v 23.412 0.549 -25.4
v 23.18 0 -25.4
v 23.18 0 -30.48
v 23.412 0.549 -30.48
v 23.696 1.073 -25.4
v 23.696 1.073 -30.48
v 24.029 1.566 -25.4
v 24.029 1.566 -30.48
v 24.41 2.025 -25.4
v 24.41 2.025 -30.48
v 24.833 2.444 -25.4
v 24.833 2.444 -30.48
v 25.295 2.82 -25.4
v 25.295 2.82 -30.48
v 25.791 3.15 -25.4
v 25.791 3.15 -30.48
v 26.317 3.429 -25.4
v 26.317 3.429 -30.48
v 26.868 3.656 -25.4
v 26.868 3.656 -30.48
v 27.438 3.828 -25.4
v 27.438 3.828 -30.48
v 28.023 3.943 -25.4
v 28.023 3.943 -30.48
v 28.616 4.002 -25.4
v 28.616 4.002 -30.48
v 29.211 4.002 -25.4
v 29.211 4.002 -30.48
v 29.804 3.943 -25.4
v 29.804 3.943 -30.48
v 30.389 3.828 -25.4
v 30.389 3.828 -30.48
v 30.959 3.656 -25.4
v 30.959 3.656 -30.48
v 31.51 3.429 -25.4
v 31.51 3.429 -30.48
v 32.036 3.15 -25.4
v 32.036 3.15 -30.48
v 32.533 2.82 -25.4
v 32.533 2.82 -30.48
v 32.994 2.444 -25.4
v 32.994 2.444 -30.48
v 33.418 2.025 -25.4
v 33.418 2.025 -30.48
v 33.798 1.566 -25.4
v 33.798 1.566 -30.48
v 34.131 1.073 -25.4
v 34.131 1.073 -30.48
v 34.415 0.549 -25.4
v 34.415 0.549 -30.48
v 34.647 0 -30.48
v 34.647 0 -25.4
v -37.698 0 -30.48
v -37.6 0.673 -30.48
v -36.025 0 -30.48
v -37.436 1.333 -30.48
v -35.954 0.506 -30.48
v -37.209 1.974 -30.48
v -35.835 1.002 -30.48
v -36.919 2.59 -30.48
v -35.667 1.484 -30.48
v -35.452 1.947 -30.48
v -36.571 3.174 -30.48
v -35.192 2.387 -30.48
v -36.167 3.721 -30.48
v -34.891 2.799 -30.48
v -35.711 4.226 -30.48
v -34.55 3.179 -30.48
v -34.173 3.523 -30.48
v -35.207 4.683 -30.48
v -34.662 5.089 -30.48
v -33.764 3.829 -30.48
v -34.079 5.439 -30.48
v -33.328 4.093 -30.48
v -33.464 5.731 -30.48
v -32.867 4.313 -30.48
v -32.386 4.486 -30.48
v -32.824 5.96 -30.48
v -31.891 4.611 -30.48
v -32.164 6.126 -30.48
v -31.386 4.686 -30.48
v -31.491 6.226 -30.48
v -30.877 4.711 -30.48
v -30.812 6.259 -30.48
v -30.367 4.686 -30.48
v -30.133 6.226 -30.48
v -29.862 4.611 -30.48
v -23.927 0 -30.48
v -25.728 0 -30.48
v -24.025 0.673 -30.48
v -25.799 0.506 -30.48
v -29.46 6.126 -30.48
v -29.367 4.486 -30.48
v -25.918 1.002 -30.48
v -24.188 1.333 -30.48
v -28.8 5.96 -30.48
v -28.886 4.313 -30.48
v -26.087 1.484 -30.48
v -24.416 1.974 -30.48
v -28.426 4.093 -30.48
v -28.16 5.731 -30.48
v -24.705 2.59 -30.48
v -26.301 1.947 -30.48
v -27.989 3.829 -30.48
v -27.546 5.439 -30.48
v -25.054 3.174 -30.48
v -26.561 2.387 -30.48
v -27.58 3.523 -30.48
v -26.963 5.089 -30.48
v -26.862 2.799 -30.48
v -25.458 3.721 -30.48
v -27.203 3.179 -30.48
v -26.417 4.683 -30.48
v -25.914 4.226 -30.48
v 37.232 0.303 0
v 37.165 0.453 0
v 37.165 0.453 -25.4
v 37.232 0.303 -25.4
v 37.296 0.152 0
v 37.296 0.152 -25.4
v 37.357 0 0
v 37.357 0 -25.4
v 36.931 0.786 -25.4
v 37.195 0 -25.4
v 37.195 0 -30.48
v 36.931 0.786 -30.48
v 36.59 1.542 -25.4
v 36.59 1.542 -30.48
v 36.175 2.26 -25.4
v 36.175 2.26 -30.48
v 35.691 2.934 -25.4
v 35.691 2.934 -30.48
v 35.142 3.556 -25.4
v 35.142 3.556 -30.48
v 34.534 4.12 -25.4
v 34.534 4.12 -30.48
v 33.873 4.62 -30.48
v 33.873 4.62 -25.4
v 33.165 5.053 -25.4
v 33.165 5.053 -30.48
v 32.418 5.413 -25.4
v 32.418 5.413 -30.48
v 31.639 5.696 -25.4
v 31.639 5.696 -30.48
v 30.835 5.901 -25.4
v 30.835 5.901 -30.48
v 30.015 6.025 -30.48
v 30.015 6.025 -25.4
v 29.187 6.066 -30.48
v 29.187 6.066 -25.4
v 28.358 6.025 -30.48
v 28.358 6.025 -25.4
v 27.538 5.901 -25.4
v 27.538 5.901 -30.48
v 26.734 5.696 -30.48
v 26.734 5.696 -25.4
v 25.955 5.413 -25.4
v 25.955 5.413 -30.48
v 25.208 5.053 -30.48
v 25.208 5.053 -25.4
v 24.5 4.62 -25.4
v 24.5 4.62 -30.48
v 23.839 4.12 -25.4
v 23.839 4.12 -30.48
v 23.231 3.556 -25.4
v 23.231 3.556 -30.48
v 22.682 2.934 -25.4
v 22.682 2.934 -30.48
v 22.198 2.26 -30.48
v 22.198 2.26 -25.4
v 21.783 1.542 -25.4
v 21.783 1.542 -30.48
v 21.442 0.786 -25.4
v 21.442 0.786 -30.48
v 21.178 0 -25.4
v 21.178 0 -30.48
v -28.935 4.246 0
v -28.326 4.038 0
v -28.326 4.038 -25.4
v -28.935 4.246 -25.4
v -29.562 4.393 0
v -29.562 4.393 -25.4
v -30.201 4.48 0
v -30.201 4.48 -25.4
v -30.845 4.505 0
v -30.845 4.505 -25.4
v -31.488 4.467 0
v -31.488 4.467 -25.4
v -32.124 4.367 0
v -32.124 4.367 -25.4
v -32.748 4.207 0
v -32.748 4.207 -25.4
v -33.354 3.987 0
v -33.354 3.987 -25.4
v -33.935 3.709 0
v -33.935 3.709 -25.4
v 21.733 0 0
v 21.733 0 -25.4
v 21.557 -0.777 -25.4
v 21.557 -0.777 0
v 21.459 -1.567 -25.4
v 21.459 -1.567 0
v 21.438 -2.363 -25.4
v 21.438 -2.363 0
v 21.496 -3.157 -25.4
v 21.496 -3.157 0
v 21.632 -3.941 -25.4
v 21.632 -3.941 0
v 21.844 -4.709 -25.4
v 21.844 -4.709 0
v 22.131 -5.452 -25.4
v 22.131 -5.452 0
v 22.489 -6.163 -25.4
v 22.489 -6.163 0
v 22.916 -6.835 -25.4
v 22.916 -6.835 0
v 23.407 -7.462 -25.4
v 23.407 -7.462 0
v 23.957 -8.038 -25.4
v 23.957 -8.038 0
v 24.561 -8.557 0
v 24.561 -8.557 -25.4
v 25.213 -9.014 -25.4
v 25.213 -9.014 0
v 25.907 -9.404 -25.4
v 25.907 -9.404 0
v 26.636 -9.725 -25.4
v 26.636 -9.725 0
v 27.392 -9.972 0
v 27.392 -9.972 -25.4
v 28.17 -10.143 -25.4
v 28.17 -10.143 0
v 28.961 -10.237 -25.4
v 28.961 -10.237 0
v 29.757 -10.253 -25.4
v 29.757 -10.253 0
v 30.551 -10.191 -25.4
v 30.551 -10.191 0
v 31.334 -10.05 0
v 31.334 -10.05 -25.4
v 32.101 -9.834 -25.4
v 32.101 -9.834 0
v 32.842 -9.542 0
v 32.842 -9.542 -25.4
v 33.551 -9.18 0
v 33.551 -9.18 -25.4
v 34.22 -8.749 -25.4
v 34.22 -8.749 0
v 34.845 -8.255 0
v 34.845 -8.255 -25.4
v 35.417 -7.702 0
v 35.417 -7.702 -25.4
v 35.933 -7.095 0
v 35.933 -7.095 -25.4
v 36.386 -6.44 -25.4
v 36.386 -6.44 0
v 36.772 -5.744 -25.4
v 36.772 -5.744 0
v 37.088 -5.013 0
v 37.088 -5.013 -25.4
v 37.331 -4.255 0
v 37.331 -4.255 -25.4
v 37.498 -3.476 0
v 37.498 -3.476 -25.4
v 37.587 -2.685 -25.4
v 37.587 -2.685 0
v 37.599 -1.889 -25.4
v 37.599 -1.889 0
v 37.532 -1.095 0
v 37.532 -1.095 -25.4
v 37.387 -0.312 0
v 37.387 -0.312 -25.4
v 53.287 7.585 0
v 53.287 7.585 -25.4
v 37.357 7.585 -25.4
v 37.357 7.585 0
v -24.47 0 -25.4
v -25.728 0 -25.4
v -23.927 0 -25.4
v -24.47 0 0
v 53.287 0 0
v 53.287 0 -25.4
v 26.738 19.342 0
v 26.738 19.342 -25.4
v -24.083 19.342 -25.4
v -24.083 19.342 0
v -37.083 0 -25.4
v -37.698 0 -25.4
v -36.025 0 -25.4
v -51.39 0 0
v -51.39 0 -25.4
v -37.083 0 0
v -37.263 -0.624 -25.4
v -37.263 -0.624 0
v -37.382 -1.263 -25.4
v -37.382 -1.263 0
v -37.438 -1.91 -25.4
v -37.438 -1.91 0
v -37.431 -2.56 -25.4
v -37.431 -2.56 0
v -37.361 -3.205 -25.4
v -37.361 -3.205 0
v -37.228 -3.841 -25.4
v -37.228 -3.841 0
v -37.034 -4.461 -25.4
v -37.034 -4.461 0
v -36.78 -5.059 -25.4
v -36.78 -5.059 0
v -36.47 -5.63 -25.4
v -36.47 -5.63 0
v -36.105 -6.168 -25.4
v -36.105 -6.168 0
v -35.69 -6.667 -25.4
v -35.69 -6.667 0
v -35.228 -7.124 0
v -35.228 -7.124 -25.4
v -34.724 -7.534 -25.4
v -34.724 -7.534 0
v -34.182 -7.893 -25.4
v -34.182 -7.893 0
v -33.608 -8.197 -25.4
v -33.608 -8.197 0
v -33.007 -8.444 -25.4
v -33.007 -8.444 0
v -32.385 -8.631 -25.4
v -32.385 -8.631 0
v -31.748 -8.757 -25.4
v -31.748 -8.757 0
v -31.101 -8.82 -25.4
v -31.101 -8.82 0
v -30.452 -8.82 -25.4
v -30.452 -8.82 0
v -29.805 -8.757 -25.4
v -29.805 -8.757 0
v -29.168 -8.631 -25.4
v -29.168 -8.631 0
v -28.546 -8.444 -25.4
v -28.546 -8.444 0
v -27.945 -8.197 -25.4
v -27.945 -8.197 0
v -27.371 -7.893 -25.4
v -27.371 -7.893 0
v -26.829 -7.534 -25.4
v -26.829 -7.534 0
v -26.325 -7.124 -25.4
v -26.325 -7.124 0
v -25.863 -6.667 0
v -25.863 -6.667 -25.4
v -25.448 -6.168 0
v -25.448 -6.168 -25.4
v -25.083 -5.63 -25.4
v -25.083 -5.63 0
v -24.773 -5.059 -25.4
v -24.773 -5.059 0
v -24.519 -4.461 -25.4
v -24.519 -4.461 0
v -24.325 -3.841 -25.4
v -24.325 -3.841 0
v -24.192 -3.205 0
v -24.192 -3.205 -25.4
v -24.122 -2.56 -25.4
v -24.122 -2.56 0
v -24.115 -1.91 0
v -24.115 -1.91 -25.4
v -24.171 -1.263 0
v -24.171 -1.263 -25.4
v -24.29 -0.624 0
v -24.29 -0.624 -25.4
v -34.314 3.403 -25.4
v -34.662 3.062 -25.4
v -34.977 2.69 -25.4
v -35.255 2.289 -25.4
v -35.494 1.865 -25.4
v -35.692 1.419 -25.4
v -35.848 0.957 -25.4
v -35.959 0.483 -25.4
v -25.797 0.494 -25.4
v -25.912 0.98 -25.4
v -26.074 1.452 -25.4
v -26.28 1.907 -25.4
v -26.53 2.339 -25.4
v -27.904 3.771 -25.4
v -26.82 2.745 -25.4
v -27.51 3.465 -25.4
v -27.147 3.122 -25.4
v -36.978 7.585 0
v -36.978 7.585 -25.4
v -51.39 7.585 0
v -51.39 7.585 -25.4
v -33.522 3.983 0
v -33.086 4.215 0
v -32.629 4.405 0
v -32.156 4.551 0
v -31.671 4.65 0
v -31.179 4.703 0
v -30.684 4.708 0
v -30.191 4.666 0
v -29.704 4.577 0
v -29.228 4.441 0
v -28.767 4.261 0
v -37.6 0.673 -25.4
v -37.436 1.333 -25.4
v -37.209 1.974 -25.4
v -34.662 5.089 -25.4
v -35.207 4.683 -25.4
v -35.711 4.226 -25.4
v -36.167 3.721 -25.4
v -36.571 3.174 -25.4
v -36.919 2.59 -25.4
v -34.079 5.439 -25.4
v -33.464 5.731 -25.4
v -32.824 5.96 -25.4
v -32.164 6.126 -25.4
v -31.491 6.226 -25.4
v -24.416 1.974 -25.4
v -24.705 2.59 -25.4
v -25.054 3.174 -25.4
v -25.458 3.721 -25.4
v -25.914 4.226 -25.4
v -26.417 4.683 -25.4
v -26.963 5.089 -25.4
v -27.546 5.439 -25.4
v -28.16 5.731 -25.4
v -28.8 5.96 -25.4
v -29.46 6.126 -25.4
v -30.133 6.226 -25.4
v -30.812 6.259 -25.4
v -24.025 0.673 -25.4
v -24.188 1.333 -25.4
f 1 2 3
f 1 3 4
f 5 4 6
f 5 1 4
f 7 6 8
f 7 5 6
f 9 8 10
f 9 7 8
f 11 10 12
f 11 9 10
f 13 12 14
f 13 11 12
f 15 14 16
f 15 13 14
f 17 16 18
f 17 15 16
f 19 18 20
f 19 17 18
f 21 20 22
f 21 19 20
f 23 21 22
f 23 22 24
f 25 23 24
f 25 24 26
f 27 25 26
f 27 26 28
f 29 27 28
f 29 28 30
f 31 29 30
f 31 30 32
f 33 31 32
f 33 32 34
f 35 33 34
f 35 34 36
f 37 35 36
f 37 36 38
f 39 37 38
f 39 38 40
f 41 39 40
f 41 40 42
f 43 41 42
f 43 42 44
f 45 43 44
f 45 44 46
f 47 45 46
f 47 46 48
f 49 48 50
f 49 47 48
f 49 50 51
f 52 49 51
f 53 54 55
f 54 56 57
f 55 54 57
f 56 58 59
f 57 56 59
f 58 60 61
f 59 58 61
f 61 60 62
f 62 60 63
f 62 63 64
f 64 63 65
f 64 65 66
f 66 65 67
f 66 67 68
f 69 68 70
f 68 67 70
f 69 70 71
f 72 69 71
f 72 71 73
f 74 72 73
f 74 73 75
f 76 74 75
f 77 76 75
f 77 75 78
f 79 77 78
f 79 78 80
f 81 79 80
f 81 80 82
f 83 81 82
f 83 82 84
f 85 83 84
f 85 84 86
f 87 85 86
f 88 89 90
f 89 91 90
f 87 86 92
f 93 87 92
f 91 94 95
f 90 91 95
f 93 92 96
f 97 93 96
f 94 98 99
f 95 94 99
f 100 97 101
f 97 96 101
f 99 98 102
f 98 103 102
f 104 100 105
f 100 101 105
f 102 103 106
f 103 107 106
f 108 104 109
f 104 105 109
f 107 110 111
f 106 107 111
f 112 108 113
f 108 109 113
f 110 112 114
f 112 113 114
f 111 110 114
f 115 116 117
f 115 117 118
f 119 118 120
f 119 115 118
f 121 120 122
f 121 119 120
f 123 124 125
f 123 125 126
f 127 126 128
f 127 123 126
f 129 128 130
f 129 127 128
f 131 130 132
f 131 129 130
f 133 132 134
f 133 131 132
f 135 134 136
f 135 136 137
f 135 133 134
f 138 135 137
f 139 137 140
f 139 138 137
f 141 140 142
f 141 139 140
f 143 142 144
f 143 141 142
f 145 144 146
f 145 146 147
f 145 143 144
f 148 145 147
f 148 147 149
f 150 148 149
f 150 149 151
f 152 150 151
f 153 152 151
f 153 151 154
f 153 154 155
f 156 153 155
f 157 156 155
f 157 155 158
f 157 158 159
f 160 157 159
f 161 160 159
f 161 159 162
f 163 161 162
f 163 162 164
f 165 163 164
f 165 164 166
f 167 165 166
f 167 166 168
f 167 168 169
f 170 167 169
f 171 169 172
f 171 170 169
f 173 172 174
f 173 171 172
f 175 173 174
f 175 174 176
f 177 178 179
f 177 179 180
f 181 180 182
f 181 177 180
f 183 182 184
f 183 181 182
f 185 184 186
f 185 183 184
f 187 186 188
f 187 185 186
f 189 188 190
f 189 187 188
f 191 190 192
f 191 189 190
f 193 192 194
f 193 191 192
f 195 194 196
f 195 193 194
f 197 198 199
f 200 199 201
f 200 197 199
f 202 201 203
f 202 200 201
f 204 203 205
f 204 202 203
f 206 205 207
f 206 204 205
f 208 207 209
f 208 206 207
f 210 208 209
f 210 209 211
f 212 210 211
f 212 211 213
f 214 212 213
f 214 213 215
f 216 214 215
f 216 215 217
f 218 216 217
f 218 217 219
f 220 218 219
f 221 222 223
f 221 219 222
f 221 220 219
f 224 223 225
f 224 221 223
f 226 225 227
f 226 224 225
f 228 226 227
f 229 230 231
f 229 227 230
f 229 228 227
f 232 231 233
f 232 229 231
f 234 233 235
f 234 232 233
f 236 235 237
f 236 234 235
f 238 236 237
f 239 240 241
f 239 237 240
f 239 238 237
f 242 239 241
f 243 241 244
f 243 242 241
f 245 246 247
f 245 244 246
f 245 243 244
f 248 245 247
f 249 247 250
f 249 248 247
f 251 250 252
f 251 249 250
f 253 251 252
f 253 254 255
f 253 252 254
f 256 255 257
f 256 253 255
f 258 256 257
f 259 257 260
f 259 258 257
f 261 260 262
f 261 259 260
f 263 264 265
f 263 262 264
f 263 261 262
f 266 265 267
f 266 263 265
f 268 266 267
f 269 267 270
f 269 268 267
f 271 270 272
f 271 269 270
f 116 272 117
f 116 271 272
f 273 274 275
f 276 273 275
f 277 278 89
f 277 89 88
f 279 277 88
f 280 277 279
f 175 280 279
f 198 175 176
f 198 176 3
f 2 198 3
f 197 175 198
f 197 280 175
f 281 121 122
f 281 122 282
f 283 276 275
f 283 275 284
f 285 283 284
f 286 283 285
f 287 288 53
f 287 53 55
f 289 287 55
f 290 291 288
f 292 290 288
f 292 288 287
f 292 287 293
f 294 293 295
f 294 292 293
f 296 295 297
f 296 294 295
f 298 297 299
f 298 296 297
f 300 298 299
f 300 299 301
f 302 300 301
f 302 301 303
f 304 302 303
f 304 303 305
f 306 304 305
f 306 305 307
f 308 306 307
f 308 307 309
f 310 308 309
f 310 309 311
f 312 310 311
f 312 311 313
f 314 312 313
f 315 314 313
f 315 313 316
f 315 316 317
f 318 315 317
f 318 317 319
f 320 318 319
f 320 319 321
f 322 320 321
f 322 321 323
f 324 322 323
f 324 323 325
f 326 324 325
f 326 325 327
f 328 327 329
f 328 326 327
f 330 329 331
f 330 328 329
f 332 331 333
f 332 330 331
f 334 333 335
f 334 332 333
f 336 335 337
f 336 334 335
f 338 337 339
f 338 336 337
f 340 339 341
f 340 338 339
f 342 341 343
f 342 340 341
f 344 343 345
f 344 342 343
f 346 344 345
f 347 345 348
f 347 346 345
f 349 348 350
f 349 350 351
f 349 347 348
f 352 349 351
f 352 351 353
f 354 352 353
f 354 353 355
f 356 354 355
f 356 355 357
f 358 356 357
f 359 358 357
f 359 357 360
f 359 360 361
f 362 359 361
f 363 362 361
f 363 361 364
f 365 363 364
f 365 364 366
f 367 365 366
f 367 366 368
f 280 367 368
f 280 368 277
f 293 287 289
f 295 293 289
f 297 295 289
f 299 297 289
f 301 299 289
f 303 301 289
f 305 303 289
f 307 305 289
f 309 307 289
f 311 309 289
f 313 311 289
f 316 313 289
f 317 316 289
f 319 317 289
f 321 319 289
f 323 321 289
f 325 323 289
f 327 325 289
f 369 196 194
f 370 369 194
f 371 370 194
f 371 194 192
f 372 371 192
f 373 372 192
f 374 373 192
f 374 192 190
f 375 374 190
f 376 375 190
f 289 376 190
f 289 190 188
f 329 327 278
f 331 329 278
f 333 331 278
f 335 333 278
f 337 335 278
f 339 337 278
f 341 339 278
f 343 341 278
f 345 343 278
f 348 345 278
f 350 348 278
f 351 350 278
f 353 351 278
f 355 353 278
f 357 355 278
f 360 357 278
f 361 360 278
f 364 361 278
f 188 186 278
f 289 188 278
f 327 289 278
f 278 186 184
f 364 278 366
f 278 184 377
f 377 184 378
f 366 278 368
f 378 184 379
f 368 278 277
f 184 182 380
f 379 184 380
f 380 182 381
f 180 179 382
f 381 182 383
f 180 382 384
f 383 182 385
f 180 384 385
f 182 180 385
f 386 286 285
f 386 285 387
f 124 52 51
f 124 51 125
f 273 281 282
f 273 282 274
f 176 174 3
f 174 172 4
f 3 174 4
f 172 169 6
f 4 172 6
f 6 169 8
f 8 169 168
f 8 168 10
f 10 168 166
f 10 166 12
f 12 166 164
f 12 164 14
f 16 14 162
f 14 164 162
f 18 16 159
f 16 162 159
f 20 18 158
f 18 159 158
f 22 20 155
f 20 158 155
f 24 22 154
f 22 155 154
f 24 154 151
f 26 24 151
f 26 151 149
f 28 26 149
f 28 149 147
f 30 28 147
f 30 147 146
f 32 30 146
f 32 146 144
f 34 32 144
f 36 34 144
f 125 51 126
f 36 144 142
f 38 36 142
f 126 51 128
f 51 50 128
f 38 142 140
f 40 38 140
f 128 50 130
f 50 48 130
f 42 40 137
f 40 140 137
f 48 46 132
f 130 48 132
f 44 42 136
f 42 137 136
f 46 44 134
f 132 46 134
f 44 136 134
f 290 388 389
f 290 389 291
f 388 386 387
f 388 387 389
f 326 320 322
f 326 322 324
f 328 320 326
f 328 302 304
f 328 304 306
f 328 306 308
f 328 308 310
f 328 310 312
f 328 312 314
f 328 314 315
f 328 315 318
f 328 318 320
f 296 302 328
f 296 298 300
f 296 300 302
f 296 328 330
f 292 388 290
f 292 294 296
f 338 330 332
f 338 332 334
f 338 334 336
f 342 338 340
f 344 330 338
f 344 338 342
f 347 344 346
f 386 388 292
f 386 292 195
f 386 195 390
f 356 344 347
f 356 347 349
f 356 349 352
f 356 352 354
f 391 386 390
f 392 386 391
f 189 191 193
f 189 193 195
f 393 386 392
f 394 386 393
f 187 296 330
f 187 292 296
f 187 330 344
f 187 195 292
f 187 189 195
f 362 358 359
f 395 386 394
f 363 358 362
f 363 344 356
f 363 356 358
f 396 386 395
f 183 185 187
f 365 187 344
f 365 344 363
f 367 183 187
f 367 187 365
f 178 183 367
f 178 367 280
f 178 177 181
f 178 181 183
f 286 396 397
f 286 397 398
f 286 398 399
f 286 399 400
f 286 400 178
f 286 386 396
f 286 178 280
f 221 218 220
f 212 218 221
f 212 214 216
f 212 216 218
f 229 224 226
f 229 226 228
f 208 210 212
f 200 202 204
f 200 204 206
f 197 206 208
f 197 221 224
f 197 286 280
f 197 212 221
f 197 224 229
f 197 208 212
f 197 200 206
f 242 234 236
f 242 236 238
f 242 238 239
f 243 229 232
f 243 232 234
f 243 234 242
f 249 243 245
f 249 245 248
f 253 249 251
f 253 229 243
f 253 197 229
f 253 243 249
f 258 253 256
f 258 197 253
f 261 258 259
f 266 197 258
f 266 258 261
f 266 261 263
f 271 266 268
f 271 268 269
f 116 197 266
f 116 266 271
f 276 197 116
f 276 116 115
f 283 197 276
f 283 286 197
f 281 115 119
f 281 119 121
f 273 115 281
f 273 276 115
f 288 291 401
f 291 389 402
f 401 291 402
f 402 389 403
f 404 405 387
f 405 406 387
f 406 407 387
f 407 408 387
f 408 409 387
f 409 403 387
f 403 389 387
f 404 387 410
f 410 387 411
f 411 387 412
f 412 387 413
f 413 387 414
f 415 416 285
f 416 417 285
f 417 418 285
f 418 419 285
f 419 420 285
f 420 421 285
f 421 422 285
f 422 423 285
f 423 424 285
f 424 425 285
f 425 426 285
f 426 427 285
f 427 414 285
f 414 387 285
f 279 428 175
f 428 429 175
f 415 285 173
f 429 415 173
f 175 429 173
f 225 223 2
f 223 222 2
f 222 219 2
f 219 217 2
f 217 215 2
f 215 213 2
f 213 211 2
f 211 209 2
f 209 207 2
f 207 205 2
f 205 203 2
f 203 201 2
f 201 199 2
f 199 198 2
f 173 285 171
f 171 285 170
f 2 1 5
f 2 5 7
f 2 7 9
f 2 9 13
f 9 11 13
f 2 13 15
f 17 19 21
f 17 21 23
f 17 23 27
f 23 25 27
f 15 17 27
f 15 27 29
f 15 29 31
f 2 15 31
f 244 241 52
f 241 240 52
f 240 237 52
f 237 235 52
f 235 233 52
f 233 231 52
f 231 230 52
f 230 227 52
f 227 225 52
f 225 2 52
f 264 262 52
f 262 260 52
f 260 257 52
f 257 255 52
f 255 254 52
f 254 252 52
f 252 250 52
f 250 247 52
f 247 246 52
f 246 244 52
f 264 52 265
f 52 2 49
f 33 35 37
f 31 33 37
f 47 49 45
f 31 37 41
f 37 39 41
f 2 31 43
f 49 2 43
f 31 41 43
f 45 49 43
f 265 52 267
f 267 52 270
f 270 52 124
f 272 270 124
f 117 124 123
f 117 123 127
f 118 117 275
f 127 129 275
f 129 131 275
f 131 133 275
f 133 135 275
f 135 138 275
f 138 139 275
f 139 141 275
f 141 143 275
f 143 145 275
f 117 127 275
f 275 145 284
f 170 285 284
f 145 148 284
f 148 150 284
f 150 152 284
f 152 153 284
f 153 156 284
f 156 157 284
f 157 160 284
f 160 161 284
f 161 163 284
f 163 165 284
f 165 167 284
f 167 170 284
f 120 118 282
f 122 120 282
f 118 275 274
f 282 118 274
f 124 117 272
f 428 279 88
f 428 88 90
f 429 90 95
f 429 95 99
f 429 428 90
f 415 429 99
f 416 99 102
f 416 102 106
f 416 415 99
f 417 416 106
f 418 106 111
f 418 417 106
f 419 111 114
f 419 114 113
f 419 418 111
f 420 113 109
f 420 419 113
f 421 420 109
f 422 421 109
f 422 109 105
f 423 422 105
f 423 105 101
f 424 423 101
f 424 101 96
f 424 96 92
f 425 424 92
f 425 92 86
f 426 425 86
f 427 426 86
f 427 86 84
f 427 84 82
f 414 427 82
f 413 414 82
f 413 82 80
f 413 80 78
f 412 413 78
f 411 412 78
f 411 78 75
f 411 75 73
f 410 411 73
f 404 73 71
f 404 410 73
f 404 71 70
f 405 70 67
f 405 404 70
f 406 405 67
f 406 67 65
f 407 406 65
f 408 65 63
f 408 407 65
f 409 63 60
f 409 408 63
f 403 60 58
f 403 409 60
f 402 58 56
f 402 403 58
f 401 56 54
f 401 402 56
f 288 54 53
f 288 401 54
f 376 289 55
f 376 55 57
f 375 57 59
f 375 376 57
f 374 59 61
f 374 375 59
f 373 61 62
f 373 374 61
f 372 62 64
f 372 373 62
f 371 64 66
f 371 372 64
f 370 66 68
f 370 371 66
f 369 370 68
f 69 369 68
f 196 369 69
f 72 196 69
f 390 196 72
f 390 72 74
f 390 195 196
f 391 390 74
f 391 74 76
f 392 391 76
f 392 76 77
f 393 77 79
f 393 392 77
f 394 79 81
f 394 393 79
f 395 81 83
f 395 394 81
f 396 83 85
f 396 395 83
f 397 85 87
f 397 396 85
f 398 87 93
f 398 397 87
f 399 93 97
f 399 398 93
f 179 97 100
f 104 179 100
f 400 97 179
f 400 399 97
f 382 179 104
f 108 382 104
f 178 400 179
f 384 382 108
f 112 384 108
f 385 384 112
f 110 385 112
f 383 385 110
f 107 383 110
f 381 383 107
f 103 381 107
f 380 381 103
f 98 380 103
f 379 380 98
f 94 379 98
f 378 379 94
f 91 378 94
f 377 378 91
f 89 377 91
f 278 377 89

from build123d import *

# Parameters (mm, degrees)
F1_DEPTH = 25.4
F2_R     = 6.666514
F2_R_2   = 8.083865
F3_DEPTH = 25.4
F5_DEPTH = 30.48


with BuildPart() as f1:
    # F0 (on Top) → F1 (new body)
    with BuildSketch(Plane.XY):
        with BuildLine():
            Line((-51.390246, 7.585276), (-51.390246, 0))
            Line((-51.390246, 0), (-36.978222, 0))
            ThreePointArc((-36.978222, 0), (-30.530737, 4.941209), (-24.083251, 0))
            Line((-24.083251, 0), (21.807669, 0))
            ThreePointArc((21.807669, 0), (29.582576, 5.313651), (37.357483, 0))
            Line((37.357483, 0), (53.286567, 0))
            Line((53.286567, 0), (53.286567, 7.585276))
            Line((53.286567, 7.585276), (37.357483, 7.585276))
            Line((37.357483, 7.585276), (26.7381, 19.342454))
            Line((26.7381, 19.342454), (-24.083251, 19.342454))
            Line((-24.083251, 19.342454), (-36.978222, 7.585276))
            Line((-36.978222, 7.585276), (-51.390246, 7.585276))
        make_face()
    extrude(amount=-F1_DEPTH)

    # F2 (on Top) → F3 (join)
    with BuildSketch(Plane.XY):
        with Locations((-30.776636, -2.161567)):
            Circle(F2_R)
        with Locations((29.519783, -2.172714)):
            Circle(F2_R_2)
    extrude(amount=-F3_DEPTH)

    # F4 (on Top) → F5 (join)
    with BuildSketch(Plane.XY):
        with BuildLine():
            Line((-25.728483, 0), (-23.92667, 0))
            ThreePointArc((-23.92667, 0), (-30.812173, 6.259093), (-37.697677, 0))
            Line((-37.697677, 0), (-36.024563, 0))
            ThreePointArc((-36.024563, 0), (-30.876523, 4.711429), (-25.728483, 0))
        make_face()
        with BuildLine():
            Line((34.646899, 0), (37.195049, 0))
            ThreePointArc((37.195049, 0), (29.186578, 6.065914), (21.178108, 0))
            Line((21.178108, 0), (23.180226, 0))
            ThreePointArc((23.180226, 0), (28.913562, 4.008779), (34.646899, 0))
        make_face()
    extrude(amount=-F5_DEPTH)


solid = f1.part
